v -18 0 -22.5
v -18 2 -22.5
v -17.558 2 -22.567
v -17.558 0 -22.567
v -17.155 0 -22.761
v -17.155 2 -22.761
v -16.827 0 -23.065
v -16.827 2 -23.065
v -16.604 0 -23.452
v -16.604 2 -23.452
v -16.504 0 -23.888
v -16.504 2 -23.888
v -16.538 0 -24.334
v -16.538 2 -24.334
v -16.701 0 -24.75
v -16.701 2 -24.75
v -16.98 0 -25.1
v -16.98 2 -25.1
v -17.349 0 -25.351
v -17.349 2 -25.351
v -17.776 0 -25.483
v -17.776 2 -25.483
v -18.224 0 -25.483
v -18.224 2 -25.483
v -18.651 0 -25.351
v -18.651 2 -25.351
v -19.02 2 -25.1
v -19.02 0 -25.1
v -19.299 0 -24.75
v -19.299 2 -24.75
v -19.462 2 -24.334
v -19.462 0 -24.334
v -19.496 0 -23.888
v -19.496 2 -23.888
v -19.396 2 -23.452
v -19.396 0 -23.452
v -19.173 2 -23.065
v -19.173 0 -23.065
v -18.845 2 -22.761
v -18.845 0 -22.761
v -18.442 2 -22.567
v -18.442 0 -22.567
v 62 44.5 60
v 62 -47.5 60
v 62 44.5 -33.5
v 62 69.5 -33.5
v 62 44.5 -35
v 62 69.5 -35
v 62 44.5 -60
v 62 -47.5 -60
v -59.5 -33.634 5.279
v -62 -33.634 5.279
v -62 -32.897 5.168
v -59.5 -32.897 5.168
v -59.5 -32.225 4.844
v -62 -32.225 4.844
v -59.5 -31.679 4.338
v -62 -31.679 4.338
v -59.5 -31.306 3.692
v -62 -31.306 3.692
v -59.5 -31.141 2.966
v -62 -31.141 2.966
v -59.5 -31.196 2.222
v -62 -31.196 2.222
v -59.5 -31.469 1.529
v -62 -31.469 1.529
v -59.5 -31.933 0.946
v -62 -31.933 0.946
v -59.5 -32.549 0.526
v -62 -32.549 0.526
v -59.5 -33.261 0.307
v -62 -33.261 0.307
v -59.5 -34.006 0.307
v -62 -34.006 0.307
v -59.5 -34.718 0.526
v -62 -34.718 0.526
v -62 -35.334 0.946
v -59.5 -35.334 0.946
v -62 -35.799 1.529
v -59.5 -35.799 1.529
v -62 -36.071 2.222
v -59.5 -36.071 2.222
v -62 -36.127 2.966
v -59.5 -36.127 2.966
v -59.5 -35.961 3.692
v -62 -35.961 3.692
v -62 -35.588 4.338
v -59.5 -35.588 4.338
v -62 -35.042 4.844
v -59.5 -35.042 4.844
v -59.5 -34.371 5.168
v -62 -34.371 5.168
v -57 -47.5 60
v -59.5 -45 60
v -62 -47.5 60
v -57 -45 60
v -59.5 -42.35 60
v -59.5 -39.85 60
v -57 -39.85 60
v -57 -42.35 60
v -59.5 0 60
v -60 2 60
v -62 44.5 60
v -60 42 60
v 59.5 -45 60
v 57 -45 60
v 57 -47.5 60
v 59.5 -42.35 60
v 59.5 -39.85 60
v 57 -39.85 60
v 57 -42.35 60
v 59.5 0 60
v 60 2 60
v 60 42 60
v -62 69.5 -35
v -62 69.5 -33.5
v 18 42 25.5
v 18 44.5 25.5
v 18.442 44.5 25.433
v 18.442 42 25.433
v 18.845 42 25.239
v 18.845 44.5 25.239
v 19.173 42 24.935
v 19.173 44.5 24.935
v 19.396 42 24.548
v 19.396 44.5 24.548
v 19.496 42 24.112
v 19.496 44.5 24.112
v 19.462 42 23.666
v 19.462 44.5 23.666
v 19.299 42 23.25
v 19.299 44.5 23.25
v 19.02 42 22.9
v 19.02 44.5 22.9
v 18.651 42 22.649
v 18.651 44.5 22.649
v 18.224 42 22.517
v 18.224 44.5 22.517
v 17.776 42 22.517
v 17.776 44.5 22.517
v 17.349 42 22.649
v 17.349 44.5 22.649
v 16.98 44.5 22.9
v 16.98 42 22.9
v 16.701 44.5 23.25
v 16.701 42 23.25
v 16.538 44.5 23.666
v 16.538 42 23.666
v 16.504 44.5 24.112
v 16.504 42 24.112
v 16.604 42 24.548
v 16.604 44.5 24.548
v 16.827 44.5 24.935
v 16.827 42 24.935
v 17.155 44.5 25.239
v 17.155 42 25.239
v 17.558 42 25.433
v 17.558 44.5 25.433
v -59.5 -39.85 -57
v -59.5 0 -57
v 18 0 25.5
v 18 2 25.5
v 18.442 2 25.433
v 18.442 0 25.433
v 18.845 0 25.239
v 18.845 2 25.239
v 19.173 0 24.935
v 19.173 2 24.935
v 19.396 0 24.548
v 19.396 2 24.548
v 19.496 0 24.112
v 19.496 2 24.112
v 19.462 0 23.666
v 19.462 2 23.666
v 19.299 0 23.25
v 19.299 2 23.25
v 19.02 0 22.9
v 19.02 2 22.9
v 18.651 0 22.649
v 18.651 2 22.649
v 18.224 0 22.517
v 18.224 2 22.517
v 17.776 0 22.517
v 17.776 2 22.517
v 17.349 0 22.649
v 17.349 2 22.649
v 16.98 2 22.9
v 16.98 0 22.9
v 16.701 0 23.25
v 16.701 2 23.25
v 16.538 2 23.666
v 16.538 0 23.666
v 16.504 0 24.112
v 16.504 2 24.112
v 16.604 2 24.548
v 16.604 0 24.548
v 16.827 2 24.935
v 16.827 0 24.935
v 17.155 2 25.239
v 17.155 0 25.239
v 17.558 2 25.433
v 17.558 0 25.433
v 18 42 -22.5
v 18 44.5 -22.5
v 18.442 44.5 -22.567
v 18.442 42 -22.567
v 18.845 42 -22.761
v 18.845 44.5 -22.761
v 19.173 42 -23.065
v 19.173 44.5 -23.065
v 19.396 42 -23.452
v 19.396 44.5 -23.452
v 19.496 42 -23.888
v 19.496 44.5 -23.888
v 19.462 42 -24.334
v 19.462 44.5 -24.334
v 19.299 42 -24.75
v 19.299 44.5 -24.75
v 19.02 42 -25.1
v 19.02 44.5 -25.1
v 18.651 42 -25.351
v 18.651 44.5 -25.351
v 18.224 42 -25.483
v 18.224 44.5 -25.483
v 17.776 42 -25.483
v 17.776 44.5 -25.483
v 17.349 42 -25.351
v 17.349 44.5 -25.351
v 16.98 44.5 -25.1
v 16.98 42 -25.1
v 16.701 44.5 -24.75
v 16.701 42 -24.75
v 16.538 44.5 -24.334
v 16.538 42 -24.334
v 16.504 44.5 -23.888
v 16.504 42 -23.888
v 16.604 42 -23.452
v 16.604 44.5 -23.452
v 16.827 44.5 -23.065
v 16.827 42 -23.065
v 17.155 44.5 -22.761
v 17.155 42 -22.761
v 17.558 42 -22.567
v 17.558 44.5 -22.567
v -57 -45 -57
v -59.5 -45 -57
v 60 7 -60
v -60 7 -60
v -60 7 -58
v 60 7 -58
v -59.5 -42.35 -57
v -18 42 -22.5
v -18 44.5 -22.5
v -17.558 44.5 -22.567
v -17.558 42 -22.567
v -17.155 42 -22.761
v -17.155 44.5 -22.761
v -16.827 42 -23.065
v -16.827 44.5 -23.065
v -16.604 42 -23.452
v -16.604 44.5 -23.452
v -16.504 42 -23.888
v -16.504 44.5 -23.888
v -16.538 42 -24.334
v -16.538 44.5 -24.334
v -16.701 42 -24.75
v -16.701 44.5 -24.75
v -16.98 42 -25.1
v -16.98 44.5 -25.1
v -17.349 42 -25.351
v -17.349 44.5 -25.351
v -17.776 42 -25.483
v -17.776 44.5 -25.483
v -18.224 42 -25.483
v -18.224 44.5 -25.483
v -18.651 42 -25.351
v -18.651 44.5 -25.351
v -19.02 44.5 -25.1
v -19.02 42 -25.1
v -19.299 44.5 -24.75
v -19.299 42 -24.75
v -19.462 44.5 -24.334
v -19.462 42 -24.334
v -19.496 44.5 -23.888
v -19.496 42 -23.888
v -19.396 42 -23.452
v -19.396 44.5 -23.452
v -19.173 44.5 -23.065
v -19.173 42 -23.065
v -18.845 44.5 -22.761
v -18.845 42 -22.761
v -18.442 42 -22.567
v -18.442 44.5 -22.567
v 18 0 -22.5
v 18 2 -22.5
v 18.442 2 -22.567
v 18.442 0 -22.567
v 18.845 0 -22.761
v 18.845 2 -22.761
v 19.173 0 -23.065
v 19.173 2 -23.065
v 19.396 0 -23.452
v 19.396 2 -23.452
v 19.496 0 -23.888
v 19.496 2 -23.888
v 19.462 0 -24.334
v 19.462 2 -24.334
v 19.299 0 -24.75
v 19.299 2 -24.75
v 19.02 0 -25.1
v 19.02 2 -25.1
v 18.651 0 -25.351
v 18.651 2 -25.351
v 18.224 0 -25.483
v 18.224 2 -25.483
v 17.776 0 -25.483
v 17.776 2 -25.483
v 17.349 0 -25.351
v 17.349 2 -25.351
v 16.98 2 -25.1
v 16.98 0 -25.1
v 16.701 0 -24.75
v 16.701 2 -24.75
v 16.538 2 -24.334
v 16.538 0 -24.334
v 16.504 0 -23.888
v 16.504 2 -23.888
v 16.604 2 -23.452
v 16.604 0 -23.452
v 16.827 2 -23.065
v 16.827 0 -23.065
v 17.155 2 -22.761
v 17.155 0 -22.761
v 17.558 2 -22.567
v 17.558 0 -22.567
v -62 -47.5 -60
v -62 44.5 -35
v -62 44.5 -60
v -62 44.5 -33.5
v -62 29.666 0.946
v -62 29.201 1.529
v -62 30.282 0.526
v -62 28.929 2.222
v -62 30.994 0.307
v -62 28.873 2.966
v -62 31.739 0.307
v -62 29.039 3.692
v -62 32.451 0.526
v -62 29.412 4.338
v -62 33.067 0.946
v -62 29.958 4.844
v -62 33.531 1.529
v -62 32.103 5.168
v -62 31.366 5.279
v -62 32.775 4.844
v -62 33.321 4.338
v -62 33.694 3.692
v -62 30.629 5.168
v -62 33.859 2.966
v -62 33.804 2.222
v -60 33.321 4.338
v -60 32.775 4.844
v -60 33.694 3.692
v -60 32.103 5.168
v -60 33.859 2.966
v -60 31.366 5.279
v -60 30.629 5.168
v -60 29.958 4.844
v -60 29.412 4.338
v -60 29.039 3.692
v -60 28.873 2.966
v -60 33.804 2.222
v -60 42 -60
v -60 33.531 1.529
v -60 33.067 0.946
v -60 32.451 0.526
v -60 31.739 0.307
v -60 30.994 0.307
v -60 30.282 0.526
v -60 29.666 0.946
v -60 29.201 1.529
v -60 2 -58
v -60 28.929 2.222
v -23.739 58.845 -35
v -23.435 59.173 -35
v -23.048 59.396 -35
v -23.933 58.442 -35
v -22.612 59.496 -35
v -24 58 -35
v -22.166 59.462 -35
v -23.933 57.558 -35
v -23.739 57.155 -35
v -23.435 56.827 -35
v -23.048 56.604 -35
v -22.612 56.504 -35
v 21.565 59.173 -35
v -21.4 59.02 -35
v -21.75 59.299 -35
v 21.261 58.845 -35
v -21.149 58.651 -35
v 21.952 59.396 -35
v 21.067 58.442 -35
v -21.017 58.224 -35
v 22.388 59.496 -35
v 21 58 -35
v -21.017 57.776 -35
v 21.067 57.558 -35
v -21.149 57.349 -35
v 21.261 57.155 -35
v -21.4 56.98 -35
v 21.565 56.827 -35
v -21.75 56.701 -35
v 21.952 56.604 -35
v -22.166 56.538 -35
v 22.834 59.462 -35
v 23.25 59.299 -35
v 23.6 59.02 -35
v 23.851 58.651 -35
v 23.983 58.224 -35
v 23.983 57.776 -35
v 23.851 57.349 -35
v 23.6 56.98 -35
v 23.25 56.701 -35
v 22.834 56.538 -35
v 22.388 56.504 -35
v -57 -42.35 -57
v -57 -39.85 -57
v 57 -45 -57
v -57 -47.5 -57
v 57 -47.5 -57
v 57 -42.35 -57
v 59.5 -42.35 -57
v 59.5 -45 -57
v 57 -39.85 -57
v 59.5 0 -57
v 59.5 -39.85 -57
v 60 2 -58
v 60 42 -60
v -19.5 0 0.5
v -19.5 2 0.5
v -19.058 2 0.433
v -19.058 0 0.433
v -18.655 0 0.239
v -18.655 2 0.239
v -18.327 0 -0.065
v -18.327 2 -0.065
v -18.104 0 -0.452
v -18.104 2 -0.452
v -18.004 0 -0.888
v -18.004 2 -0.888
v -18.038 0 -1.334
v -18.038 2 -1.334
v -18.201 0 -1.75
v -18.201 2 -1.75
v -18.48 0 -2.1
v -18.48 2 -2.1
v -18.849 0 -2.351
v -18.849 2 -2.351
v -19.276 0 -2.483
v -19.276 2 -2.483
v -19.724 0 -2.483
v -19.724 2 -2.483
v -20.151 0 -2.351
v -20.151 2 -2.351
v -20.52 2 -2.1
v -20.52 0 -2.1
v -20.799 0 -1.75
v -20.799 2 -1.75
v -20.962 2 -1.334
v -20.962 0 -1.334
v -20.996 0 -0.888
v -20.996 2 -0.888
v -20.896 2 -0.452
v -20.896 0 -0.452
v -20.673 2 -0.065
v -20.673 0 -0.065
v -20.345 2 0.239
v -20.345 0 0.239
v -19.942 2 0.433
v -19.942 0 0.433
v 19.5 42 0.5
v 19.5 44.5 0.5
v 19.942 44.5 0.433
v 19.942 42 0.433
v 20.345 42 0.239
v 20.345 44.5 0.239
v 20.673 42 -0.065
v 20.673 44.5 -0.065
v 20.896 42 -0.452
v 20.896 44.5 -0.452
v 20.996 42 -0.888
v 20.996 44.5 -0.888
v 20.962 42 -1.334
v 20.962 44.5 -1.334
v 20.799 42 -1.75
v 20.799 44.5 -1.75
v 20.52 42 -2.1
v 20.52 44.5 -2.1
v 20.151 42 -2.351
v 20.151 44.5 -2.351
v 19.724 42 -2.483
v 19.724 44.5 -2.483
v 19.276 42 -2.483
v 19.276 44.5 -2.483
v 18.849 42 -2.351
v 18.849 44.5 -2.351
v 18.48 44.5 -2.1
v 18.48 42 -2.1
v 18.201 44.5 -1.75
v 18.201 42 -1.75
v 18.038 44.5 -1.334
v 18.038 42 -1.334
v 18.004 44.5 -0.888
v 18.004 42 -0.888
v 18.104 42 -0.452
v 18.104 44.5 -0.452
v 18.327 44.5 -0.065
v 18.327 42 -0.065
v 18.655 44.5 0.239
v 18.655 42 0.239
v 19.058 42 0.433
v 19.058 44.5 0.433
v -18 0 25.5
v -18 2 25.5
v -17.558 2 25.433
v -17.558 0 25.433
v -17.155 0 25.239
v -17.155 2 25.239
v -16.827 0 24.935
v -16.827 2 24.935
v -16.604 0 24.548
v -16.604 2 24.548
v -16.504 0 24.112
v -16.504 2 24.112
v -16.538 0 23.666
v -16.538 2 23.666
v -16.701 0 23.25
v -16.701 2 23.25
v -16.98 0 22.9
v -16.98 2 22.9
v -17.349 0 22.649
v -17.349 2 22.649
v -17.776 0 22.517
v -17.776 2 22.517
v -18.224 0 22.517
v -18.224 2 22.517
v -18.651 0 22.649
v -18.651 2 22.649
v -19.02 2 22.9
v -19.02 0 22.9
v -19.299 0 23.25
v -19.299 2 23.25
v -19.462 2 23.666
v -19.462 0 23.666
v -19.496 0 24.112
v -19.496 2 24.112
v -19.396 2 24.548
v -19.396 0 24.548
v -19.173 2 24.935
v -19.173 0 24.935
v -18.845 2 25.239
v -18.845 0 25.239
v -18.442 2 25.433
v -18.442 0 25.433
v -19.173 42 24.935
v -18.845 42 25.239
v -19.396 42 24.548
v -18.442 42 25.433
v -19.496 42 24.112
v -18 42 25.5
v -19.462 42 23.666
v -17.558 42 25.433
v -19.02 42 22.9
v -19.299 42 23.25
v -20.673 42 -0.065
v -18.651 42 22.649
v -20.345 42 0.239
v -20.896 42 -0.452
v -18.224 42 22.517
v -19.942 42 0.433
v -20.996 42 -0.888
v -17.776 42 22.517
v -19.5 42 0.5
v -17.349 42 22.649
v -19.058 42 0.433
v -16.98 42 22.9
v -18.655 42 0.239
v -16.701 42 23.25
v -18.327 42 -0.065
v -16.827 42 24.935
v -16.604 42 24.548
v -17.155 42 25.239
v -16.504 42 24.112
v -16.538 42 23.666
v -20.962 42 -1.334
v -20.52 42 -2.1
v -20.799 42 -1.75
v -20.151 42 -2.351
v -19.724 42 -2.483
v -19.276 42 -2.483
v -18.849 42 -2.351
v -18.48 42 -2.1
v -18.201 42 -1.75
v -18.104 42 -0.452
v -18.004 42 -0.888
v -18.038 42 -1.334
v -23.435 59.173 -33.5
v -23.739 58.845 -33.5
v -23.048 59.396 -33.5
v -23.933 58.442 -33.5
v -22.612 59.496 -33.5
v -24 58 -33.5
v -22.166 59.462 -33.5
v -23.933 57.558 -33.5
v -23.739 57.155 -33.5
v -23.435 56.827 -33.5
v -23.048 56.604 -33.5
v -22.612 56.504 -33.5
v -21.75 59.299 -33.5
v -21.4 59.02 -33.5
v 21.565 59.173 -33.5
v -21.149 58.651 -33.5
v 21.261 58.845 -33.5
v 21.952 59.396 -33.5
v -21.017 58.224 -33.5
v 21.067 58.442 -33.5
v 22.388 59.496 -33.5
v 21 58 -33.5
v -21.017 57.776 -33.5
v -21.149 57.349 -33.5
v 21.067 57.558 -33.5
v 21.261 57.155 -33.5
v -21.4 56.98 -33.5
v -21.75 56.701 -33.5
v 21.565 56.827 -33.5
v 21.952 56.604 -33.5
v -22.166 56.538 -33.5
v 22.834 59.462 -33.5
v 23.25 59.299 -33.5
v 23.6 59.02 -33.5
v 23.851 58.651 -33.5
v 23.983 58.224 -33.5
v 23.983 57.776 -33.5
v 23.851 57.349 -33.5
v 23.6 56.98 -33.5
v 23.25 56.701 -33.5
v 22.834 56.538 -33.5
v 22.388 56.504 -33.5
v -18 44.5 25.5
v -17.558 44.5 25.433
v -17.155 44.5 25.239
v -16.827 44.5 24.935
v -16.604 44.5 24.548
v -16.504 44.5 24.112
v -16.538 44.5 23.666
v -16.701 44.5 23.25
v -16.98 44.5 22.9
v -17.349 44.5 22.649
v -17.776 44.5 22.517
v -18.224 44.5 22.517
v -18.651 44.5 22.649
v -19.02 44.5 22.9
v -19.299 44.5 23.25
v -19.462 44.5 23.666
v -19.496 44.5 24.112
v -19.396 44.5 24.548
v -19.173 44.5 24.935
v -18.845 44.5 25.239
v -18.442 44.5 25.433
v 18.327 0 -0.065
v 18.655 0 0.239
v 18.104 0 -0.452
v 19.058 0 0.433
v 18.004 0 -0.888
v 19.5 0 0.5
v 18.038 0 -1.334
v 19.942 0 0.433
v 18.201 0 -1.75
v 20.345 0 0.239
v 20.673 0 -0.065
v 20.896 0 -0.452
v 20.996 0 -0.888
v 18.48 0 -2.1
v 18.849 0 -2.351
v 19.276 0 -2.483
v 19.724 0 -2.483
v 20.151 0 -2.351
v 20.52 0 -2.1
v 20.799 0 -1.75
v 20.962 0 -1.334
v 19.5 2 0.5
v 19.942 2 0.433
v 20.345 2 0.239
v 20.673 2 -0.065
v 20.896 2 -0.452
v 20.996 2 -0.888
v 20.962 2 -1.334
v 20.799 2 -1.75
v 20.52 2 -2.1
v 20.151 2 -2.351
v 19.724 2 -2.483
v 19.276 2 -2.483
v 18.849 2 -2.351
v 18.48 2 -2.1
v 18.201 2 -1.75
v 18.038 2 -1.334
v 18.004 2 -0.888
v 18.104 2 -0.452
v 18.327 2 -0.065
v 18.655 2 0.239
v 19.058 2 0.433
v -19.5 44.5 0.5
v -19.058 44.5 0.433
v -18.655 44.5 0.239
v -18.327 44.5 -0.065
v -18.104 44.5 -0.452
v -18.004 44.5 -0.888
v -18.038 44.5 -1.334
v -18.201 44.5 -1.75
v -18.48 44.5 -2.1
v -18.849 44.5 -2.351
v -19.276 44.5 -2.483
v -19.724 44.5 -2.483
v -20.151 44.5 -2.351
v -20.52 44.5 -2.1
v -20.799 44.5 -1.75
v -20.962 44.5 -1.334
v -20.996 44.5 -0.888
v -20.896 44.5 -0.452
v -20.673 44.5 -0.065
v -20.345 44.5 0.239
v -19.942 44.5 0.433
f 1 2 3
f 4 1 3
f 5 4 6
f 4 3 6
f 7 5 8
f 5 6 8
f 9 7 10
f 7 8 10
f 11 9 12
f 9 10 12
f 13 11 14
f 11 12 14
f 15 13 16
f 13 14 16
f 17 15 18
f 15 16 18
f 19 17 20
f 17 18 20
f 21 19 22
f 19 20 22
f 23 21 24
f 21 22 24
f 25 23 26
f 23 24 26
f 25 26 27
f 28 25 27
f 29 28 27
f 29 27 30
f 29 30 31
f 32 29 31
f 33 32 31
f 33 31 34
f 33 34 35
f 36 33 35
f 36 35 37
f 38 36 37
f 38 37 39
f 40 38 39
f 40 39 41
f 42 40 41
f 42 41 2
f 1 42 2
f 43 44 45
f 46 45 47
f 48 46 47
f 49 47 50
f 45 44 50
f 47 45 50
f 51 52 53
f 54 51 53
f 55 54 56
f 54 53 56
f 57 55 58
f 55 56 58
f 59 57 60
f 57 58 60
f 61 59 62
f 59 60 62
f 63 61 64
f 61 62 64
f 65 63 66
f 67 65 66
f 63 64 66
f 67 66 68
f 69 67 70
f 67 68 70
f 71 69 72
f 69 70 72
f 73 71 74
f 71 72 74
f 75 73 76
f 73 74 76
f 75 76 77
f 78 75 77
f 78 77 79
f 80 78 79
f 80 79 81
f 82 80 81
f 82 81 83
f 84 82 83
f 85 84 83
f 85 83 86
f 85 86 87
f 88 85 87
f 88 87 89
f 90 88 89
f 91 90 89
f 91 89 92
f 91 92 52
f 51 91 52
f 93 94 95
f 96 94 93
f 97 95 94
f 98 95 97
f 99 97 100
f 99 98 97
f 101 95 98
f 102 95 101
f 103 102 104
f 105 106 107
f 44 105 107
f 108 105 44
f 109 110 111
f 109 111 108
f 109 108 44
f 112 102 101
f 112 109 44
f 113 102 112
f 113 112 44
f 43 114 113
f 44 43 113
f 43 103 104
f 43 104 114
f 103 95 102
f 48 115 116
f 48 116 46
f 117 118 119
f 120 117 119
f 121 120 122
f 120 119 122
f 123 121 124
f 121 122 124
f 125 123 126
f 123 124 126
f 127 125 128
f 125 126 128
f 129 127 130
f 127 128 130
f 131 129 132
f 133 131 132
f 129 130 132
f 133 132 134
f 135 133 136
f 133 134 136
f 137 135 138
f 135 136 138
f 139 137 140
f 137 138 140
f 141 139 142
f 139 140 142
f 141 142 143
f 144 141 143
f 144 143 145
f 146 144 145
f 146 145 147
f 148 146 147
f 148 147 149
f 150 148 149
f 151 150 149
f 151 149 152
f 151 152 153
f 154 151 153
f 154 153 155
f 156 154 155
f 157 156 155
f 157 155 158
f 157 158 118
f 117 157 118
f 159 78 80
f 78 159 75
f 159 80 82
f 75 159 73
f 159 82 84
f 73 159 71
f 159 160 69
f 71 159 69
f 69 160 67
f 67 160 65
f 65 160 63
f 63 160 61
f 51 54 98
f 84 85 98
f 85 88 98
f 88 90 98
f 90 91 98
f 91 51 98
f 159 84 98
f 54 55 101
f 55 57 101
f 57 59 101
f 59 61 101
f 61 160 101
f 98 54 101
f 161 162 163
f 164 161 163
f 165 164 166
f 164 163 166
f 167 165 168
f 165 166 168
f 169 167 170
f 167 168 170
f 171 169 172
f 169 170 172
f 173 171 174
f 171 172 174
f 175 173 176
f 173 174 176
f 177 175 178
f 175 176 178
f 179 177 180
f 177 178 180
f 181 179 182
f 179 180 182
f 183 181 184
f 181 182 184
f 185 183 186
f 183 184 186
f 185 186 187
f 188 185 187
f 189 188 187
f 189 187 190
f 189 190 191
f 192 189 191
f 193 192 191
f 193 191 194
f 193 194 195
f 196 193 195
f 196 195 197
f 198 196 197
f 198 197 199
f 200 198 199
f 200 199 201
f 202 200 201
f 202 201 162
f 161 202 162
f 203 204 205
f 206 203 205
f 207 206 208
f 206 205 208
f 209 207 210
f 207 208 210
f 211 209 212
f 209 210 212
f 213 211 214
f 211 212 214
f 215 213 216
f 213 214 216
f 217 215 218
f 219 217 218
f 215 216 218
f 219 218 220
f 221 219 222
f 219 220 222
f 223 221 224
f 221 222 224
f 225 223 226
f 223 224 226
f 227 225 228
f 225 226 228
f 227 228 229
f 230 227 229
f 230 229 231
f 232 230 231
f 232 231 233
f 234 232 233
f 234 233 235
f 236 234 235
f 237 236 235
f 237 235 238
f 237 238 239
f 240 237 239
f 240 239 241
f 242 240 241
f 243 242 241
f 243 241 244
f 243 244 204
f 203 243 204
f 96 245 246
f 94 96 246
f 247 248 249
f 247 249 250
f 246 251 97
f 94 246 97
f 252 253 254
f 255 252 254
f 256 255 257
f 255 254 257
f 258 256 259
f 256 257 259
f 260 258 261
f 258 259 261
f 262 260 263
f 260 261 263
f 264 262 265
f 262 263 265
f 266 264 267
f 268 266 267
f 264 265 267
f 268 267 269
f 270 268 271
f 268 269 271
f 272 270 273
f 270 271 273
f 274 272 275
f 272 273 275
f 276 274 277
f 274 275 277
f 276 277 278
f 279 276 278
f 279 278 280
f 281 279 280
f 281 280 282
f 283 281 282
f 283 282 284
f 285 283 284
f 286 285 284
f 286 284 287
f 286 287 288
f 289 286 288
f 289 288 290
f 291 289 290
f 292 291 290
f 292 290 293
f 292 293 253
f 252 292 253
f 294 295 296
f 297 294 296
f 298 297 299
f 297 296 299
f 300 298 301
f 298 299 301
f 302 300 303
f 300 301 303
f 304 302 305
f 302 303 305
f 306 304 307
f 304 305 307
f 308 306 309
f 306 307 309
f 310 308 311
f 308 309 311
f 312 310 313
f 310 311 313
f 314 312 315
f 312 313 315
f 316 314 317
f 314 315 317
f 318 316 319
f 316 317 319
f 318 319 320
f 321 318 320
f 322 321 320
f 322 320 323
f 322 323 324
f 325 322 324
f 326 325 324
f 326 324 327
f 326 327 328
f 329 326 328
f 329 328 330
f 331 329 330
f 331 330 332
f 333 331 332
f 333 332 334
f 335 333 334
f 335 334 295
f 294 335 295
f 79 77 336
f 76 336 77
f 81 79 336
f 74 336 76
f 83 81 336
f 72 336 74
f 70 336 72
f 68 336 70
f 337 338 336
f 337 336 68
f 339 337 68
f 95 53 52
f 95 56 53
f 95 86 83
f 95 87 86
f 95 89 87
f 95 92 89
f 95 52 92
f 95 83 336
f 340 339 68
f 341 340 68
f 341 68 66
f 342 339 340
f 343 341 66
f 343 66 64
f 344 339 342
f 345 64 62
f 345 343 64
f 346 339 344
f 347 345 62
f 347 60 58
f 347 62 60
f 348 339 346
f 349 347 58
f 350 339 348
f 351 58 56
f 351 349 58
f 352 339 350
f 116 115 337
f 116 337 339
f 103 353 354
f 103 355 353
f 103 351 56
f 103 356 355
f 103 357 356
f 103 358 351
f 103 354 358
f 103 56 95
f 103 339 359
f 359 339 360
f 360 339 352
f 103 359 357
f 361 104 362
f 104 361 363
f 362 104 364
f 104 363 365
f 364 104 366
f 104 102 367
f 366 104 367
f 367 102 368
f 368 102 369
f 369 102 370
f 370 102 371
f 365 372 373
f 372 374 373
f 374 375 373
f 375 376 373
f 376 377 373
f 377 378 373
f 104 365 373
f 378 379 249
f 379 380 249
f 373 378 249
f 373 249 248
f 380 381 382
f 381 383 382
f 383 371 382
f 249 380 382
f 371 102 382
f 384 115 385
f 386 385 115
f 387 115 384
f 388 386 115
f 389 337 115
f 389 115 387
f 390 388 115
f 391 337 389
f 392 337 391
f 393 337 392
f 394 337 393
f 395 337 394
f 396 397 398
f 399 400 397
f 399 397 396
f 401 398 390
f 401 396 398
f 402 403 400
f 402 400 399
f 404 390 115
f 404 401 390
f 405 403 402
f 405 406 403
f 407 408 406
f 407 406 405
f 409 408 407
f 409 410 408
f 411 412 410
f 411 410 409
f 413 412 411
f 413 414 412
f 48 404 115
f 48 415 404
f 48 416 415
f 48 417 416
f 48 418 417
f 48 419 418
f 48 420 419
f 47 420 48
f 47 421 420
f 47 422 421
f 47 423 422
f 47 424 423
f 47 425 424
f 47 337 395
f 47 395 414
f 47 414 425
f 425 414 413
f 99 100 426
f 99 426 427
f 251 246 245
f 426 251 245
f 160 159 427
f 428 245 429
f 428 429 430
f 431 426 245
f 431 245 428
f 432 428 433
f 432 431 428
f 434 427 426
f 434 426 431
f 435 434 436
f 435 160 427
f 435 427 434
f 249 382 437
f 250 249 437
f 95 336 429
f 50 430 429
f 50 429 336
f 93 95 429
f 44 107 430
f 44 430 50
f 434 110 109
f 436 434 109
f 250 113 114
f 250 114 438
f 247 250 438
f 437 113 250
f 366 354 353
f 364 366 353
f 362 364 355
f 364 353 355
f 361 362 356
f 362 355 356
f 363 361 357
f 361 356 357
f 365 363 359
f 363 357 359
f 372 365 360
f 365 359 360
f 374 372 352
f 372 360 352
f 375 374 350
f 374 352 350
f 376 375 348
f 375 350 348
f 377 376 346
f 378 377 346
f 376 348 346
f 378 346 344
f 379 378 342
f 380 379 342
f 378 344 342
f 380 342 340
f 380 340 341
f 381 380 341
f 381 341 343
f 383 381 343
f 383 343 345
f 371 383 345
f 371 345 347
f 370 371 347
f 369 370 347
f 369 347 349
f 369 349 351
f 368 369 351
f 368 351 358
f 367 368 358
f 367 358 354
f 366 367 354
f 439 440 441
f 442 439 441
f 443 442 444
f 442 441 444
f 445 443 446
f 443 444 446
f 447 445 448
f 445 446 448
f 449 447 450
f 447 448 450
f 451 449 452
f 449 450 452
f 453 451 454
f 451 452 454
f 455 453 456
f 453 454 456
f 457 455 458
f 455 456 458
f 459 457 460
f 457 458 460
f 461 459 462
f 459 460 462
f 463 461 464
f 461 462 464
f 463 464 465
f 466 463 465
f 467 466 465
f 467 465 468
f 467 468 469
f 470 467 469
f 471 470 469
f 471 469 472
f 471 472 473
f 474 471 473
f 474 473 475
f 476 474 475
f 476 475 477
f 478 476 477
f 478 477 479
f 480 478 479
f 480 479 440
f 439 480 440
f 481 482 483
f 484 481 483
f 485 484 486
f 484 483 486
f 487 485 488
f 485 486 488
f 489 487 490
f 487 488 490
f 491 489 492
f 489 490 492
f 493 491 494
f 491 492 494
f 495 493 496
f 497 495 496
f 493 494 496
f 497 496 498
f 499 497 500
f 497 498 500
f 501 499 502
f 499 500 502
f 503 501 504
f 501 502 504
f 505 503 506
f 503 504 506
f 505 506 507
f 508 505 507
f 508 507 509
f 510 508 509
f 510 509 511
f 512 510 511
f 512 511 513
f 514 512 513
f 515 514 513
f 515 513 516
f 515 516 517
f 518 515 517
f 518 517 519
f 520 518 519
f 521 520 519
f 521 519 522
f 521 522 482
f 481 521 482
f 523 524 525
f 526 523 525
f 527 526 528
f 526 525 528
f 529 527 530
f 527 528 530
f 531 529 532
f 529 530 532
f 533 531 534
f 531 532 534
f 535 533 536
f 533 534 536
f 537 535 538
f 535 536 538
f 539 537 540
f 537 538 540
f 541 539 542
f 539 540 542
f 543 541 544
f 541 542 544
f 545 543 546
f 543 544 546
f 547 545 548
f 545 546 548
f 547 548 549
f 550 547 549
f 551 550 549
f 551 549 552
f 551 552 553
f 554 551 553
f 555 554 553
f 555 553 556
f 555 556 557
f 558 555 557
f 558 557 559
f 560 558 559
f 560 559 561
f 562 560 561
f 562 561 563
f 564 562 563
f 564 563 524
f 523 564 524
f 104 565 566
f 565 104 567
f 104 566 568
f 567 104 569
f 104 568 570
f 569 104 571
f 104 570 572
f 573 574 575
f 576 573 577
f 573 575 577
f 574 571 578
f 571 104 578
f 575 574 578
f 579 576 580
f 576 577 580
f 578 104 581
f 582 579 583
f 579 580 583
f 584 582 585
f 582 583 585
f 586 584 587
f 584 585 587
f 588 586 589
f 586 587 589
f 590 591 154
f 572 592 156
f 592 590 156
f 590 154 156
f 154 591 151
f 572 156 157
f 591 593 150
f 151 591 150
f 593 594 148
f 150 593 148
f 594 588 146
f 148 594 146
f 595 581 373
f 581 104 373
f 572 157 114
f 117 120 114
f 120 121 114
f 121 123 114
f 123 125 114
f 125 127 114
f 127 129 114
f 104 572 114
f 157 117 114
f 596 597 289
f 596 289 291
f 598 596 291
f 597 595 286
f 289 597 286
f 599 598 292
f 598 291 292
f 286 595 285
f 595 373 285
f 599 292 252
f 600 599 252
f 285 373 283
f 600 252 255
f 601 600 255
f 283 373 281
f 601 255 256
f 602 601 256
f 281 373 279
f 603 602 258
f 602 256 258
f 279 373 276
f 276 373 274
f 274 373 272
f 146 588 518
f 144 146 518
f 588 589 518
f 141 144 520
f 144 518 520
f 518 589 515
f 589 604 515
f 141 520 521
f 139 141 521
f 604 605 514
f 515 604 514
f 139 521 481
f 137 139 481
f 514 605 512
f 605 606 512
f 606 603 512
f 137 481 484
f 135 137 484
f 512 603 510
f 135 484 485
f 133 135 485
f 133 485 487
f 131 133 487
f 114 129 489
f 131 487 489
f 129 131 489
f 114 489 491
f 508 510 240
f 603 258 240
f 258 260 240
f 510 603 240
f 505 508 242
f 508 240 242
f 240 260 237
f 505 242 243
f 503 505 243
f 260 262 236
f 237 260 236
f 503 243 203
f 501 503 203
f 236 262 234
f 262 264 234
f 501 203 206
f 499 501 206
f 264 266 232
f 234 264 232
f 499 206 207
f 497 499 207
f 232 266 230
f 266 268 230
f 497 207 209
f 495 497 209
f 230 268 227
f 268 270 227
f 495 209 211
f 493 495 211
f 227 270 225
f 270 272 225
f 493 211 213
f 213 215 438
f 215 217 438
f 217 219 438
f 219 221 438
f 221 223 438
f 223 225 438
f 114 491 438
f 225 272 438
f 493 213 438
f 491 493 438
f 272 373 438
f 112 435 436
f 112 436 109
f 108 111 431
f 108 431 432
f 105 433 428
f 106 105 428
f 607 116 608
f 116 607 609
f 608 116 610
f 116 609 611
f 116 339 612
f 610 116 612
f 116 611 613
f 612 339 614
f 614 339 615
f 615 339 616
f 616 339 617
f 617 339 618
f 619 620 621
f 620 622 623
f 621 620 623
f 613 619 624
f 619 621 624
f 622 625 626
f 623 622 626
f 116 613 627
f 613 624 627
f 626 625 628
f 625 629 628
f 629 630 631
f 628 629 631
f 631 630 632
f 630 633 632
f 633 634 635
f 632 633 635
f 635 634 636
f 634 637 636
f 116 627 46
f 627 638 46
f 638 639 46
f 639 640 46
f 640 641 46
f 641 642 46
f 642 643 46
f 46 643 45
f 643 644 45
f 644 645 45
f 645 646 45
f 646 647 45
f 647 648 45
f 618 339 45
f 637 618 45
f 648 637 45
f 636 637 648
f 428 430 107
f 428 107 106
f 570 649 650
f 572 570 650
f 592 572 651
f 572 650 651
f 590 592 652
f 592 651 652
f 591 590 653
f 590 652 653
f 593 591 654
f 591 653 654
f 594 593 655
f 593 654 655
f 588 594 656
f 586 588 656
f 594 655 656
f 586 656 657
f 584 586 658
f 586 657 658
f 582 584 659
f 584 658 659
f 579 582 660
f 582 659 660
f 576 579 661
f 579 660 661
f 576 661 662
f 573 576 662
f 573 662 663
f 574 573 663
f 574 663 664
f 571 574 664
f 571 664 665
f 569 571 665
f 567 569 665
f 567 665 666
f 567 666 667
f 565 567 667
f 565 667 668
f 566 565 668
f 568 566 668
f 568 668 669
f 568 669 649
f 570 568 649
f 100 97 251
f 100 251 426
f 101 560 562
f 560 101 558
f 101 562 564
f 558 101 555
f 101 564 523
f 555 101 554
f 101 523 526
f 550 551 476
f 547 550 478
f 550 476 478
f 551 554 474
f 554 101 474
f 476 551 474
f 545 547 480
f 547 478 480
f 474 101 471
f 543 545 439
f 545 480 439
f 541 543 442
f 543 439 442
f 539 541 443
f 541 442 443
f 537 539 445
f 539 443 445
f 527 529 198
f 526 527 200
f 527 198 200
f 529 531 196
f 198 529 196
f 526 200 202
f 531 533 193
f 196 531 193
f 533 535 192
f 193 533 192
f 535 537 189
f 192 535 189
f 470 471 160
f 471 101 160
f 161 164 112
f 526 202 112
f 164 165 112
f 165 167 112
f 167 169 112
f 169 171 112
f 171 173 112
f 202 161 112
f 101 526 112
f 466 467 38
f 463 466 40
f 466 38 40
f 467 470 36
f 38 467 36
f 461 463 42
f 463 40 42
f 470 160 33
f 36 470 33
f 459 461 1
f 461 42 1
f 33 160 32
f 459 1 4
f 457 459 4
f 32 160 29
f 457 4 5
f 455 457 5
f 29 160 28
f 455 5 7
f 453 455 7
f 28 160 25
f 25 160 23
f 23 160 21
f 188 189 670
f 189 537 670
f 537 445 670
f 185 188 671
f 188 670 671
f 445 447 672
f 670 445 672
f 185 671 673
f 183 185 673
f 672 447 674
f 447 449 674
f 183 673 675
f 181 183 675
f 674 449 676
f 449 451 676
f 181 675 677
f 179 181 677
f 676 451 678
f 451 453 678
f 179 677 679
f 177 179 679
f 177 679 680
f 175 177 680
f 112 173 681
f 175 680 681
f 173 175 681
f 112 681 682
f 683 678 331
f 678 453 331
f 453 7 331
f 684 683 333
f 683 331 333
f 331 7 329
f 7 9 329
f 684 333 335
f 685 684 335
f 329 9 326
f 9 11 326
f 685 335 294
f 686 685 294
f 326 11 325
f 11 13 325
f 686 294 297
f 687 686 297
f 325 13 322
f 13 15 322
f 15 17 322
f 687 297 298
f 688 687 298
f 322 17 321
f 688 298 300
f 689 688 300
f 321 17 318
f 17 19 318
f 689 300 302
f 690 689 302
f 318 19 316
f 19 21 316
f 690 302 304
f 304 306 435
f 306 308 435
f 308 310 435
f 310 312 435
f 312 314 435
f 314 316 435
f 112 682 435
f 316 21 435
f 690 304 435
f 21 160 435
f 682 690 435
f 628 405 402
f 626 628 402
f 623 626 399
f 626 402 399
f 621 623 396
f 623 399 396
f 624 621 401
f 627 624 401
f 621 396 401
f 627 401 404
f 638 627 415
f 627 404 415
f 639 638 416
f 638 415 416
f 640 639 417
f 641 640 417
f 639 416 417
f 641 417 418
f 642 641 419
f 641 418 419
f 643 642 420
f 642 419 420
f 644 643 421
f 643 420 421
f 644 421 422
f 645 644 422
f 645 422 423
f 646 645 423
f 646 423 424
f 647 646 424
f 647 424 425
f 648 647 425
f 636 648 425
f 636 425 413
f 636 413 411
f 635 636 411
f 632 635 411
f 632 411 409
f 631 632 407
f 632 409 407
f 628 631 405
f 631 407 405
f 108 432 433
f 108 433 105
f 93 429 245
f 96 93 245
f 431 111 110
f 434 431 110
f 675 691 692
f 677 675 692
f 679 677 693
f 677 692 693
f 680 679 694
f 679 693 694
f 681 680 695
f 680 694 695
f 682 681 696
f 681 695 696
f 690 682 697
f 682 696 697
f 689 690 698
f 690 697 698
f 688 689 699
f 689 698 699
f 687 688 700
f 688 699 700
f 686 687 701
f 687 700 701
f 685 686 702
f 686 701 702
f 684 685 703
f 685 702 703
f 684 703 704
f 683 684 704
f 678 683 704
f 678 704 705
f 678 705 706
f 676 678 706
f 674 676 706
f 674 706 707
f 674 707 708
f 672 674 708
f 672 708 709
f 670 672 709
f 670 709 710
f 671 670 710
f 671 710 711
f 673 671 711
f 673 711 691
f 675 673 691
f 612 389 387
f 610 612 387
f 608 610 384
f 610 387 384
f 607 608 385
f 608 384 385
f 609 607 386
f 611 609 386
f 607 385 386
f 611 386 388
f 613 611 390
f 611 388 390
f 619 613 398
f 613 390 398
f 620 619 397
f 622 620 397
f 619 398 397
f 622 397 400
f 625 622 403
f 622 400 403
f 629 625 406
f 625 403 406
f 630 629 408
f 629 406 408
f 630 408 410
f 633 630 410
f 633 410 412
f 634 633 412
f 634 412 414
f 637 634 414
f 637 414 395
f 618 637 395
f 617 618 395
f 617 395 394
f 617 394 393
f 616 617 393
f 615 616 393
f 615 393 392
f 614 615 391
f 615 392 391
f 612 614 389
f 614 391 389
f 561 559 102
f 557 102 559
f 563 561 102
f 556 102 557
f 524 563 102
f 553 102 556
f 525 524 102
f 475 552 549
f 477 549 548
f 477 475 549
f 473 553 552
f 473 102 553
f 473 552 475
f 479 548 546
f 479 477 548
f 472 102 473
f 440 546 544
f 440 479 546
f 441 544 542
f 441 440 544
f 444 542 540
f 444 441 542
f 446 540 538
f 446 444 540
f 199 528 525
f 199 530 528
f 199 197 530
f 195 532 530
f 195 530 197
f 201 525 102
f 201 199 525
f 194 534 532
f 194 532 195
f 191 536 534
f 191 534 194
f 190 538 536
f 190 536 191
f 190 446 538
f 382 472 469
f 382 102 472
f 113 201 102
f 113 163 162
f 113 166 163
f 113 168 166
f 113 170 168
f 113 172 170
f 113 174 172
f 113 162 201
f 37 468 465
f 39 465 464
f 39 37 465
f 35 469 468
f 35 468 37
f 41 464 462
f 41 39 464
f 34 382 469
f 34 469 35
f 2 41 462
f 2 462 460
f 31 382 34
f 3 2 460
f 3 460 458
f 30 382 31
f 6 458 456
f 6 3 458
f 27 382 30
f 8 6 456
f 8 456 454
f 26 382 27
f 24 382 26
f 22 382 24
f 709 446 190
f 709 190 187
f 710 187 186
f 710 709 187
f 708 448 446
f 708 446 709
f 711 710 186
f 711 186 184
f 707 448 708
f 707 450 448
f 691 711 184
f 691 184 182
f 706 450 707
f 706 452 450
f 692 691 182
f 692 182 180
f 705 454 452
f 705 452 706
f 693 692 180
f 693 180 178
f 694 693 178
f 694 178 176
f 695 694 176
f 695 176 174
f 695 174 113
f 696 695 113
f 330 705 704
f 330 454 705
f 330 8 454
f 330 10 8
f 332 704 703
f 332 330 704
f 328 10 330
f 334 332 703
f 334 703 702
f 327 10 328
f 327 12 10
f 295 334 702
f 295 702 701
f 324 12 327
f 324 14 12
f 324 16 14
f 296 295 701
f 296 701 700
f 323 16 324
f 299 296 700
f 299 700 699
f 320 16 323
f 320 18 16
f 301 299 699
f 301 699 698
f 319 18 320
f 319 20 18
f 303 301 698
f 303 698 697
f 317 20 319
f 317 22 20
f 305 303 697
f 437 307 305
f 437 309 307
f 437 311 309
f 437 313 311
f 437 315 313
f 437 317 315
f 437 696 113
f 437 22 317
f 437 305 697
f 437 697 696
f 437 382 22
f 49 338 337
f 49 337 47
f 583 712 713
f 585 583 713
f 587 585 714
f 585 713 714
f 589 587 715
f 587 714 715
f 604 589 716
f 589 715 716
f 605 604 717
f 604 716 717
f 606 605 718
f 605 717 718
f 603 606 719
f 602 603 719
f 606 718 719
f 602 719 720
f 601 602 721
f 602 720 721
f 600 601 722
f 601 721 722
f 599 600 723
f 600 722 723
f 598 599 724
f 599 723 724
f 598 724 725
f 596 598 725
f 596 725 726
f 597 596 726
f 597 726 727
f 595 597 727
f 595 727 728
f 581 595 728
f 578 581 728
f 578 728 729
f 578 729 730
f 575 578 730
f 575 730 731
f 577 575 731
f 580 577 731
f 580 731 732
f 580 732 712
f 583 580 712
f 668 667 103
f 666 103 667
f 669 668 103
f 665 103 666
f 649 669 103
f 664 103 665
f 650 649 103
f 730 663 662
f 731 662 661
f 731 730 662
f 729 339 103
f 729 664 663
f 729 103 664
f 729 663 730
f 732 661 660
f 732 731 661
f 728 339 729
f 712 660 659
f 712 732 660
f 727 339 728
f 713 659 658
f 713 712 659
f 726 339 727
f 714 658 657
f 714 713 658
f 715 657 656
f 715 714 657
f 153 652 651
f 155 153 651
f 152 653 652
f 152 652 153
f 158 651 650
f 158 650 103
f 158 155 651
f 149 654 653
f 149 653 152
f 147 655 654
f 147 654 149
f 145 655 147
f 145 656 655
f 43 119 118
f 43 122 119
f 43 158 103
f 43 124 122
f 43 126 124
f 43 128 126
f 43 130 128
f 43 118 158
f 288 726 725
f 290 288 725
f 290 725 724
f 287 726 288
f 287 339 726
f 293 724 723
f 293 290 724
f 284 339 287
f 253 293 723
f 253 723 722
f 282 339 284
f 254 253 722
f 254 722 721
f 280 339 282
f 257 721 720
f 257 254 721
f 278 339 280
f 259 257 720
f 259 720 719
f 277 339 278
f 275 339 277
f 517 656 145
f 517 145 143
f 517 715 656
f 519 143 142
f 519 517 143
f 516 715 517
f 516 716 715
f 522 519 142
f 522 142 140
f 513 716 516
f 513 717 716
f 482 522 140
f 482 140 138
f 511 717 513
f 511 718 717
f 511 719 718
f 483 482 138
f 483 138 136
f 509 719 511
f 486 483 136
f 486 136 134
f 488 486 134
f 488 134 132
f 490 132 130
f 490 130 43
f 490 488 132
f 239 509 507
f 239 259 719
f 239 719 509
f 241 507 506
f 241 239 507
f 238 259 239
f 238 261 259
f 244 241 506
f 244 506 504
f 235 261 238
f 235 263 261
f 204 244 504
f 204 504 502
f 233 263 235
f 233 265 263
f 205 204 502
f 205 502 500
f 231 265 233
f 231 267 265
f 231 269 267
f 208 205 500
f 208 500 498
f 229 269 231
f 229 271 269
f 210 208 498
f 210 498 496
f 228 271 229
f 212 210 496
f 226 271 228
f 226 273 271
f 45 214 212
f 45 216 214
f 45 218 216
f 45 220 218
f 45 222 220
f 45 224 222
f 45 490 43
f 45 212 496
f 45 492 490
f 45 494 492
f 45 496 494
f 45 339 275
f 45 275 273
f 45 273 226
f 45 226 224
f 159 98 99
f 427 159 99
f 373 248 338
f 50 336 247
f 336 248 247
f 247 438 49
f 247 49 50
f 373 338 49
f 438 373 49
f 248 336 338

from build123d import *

# Parameters (mm, degrees)
SKETCH_2_W          = 124
SKETCH_2_H          = 120
EXTRUDE_1_DEPTH     = 2
SKETCH_3_W          = 2
SKETCH_3_H          = 120
EXTRUDE_2_DEPTH     = 40
SKETCH_4_W          = 120
SKETCH_4_H          = 2
EXTRUDE_3_DEPTH     = 5
SKETCH_6_W          = 124
SKETCH_6_H          = 120
EXTRUDE_4_DEPTH     = 2.5
SKETCH_9_W          = 124
SKETCH_9_H          = 1.5
EXTRUDE_5_DEPTH     = 25
SKETCH_10_R         = 1.5
CUT_EXTRUDE_2_DEPTH = 1.5
SKETCH_11_R         = 1.5
CUT_EXTRUDE_3_DEPTH = 51
SKETCH_12_W         = 2.5
SKETCH_12_H         = 120
EXTRUDE_6_DEPTH     = 47.5
SKETCH_14_W         = 2.5
SKETCH_14_H         = 2.5
EXTRUDE_8_DEPTH     = 120
SKETCH_15_W         = 119
SKETCH_15_H         = 3
EXTRUDE_9_DEPTH     = 47.5
SKETCH_16_R         = 2.5
CUT_EXTRUDE_4_DEPTH = 10
SKETCH_18_W         = 2.5
SKETCH_18_H         = 2.5
EXTRUDE_10_DEPTH    = 120


with BuildPart() as part:
    # 草图2 → 凸台-拉伸1 (new body)
    with BuildSketch(Plane(origin=(0, 0, 0), x_dir=(1, 0, 0), z_dir=(0, 1, 0))):
        Rectangle(SKETCH_2_W, SKETCH_2_H)
    extrude(amount=EXTRUDE_1_DEPTH)

    # 草图3 → 凸台-拉伸2 (add)
    with BuildSketch(Plane(origin=(0, 2, 0), x_dir=(1, 0, 0), z_dir=(0, 1, 0))):
        with Locations((-61, 0)):
            Rectangle(SKETCH_3_W, SKETCH_3_H)
        with Locations((61, 0)):
            Rectangle(SKETCH_3_W, SKETCH_3_H)
    extrude(amount=EXTRUDE_2_DEPTH)

    # 草图4 → 凸台-拉伸3 (add)
    with BuildSketch(Plane(origin=(0, 2, 0), x_dir=(1, 0, 0), z_dir=(0, 1, 0))):
        with Locations((0, 59)):
            Rectangle(SKETCH_4_W, SKETCH_4_H)
    extrude(amount=EXTRUDE_3_DEPTH)

    # 草图6 → 凸台-拉伸4 (add)
    with BuildSketch(Plane(origin=(0, 42, 0), x_dir=(1, 0, 0), z_dir=(0, 1, 0))):
        Rectangle(SKETCH_6_W, SKETCH_6_H)
    extrude(amount=EXTRUDE_4_DEPTH)

    # 草图9 → 凸台-拉伸5 (add)
    with BuildSketch(Plane(origin=(0, 44.5, 0), x_dir=(1, 0, 0), z_dir=(0, 1, 0))):
        with Locations((0, 34.25)):
            Rectangle(SKETCH_9_W, SKETCH_9_H)
    extrude(amount=EXTRUDE_5_DEPTH)

    # 草图10 → 切除-拉伸2 (cut)
    with BuildSketch(Plane(origin=(0, 0, -35), x_dir=(-1, 0, 0), z_dir=(0, 0, -1))):
        with Locations((-22.5, 58)):
            Circle(SKETCH_10_R)
        with Locations((22.5, 58)):
            Circle(SKETCH_10_R)
    extrude(amount=-CUT_EXTRUDE_2_DEPTH, mode=Mode.SUBTRACT)

    # 草图11 → 切除-拉伸3 (cut)
    with BuildSketch(Plane(origin=(0, 44.5, 0), x_dir=(1, 0, 0), z_dir=(0, 1, 0))):
        with Locations(Location((-19.5, 1, 0), (0, 0, 270))):
            Circle(SKETCH_11_R)
        with Locations(Location((-18, 24, 0), (0, 0, 270))):
            Circle(SKETCH_11_R)
        with Locations(Location((-18, -24, 0), (0, 0, 270))):
            Circle(SKETCH_11_R)
        with Locations(Location((18, -24, 0), (0, 0, 270))):
            Circle(SKETCH_11_R)
        with Locations(Location((19.5, 1, 0), (0, 0, 270))):
            Circle(SKETCH_11_R)
        with Locations(Location((18, 24, 0), (0, 0, 270))):
            Circle(SKETCH_11_R)
    extrude(amount=-CUT_EXTRUDE_3_DEPTH, mode=Mode.SUBTRACT)

    # 草图12 → 凸台-拉伸6 (add)
    with BuildSketch(Plane.XZ):
        with Locations((-60.75, 0)):
            Rectangle(SKETCH_12_W, SKETCH_12_H)
        with Locations((60.75, 0)):
            Rectangle(SKETCH_12_W, SKETCH_12_H)
    extrude(amount=EXTRUDE_6_DEPTH)

    # 草图14 → 凸台-拉伸8 (add)
    with BuildSketch(Plane(origin=(0, 0, -60), x_dir=(-1, 0, 0), z_dir=(0, 0, -1))):
        with Locations((-58.25, -46.25)):
            Rectangle(SKETCH_14_W, SKETCH_14_H)
        with Locations((58.25, -46.25)):
            Rectangle(SKETCH_14_W, SKETCH_14_H)
    extrude(amount=-EXTRUDE_8_DEPTH)

    # 草图15 → 凸台-拉伸9 (add)
    with BuildSketch(Plane.XZ):
        with Locations((0, -58.5)):
            Rectangle(SKETCH_15_W, SKETCH_15_H)
    extrude(amount=EXTRUDE_9_DEPTH)

    # 草图16 → 切除-拉伸4 (cut)
    with BuildSketch(Plane.ZY.offset(62)):
        with Locations((2.778789214, 31.36631919)):
            Circle(SKETCH_16_R)
        with Locations((2.778789214, -33.63368081)):
            Circle(SKETCH_16_R)
    extrude(amount=-CUT_EXTRUDE_4_DEPTH, mode=Mode.SUBTRACT)

    # 草图18 → 凸台-拉伸10 (add)
    with BuildSketch(Plane.XY.offset(60)):
        with Locations((-58.25, -41.1)):
            Rectangle(SKETCH_18_W, SKETCH_18_H)
        with Locations((58.25, -41.1)):
            Rectangle(SKETCH_18_W, SKETCH_18_H)
    extrude(amount=-EXTRUDE_10_DEPTH)


solid = part.part
